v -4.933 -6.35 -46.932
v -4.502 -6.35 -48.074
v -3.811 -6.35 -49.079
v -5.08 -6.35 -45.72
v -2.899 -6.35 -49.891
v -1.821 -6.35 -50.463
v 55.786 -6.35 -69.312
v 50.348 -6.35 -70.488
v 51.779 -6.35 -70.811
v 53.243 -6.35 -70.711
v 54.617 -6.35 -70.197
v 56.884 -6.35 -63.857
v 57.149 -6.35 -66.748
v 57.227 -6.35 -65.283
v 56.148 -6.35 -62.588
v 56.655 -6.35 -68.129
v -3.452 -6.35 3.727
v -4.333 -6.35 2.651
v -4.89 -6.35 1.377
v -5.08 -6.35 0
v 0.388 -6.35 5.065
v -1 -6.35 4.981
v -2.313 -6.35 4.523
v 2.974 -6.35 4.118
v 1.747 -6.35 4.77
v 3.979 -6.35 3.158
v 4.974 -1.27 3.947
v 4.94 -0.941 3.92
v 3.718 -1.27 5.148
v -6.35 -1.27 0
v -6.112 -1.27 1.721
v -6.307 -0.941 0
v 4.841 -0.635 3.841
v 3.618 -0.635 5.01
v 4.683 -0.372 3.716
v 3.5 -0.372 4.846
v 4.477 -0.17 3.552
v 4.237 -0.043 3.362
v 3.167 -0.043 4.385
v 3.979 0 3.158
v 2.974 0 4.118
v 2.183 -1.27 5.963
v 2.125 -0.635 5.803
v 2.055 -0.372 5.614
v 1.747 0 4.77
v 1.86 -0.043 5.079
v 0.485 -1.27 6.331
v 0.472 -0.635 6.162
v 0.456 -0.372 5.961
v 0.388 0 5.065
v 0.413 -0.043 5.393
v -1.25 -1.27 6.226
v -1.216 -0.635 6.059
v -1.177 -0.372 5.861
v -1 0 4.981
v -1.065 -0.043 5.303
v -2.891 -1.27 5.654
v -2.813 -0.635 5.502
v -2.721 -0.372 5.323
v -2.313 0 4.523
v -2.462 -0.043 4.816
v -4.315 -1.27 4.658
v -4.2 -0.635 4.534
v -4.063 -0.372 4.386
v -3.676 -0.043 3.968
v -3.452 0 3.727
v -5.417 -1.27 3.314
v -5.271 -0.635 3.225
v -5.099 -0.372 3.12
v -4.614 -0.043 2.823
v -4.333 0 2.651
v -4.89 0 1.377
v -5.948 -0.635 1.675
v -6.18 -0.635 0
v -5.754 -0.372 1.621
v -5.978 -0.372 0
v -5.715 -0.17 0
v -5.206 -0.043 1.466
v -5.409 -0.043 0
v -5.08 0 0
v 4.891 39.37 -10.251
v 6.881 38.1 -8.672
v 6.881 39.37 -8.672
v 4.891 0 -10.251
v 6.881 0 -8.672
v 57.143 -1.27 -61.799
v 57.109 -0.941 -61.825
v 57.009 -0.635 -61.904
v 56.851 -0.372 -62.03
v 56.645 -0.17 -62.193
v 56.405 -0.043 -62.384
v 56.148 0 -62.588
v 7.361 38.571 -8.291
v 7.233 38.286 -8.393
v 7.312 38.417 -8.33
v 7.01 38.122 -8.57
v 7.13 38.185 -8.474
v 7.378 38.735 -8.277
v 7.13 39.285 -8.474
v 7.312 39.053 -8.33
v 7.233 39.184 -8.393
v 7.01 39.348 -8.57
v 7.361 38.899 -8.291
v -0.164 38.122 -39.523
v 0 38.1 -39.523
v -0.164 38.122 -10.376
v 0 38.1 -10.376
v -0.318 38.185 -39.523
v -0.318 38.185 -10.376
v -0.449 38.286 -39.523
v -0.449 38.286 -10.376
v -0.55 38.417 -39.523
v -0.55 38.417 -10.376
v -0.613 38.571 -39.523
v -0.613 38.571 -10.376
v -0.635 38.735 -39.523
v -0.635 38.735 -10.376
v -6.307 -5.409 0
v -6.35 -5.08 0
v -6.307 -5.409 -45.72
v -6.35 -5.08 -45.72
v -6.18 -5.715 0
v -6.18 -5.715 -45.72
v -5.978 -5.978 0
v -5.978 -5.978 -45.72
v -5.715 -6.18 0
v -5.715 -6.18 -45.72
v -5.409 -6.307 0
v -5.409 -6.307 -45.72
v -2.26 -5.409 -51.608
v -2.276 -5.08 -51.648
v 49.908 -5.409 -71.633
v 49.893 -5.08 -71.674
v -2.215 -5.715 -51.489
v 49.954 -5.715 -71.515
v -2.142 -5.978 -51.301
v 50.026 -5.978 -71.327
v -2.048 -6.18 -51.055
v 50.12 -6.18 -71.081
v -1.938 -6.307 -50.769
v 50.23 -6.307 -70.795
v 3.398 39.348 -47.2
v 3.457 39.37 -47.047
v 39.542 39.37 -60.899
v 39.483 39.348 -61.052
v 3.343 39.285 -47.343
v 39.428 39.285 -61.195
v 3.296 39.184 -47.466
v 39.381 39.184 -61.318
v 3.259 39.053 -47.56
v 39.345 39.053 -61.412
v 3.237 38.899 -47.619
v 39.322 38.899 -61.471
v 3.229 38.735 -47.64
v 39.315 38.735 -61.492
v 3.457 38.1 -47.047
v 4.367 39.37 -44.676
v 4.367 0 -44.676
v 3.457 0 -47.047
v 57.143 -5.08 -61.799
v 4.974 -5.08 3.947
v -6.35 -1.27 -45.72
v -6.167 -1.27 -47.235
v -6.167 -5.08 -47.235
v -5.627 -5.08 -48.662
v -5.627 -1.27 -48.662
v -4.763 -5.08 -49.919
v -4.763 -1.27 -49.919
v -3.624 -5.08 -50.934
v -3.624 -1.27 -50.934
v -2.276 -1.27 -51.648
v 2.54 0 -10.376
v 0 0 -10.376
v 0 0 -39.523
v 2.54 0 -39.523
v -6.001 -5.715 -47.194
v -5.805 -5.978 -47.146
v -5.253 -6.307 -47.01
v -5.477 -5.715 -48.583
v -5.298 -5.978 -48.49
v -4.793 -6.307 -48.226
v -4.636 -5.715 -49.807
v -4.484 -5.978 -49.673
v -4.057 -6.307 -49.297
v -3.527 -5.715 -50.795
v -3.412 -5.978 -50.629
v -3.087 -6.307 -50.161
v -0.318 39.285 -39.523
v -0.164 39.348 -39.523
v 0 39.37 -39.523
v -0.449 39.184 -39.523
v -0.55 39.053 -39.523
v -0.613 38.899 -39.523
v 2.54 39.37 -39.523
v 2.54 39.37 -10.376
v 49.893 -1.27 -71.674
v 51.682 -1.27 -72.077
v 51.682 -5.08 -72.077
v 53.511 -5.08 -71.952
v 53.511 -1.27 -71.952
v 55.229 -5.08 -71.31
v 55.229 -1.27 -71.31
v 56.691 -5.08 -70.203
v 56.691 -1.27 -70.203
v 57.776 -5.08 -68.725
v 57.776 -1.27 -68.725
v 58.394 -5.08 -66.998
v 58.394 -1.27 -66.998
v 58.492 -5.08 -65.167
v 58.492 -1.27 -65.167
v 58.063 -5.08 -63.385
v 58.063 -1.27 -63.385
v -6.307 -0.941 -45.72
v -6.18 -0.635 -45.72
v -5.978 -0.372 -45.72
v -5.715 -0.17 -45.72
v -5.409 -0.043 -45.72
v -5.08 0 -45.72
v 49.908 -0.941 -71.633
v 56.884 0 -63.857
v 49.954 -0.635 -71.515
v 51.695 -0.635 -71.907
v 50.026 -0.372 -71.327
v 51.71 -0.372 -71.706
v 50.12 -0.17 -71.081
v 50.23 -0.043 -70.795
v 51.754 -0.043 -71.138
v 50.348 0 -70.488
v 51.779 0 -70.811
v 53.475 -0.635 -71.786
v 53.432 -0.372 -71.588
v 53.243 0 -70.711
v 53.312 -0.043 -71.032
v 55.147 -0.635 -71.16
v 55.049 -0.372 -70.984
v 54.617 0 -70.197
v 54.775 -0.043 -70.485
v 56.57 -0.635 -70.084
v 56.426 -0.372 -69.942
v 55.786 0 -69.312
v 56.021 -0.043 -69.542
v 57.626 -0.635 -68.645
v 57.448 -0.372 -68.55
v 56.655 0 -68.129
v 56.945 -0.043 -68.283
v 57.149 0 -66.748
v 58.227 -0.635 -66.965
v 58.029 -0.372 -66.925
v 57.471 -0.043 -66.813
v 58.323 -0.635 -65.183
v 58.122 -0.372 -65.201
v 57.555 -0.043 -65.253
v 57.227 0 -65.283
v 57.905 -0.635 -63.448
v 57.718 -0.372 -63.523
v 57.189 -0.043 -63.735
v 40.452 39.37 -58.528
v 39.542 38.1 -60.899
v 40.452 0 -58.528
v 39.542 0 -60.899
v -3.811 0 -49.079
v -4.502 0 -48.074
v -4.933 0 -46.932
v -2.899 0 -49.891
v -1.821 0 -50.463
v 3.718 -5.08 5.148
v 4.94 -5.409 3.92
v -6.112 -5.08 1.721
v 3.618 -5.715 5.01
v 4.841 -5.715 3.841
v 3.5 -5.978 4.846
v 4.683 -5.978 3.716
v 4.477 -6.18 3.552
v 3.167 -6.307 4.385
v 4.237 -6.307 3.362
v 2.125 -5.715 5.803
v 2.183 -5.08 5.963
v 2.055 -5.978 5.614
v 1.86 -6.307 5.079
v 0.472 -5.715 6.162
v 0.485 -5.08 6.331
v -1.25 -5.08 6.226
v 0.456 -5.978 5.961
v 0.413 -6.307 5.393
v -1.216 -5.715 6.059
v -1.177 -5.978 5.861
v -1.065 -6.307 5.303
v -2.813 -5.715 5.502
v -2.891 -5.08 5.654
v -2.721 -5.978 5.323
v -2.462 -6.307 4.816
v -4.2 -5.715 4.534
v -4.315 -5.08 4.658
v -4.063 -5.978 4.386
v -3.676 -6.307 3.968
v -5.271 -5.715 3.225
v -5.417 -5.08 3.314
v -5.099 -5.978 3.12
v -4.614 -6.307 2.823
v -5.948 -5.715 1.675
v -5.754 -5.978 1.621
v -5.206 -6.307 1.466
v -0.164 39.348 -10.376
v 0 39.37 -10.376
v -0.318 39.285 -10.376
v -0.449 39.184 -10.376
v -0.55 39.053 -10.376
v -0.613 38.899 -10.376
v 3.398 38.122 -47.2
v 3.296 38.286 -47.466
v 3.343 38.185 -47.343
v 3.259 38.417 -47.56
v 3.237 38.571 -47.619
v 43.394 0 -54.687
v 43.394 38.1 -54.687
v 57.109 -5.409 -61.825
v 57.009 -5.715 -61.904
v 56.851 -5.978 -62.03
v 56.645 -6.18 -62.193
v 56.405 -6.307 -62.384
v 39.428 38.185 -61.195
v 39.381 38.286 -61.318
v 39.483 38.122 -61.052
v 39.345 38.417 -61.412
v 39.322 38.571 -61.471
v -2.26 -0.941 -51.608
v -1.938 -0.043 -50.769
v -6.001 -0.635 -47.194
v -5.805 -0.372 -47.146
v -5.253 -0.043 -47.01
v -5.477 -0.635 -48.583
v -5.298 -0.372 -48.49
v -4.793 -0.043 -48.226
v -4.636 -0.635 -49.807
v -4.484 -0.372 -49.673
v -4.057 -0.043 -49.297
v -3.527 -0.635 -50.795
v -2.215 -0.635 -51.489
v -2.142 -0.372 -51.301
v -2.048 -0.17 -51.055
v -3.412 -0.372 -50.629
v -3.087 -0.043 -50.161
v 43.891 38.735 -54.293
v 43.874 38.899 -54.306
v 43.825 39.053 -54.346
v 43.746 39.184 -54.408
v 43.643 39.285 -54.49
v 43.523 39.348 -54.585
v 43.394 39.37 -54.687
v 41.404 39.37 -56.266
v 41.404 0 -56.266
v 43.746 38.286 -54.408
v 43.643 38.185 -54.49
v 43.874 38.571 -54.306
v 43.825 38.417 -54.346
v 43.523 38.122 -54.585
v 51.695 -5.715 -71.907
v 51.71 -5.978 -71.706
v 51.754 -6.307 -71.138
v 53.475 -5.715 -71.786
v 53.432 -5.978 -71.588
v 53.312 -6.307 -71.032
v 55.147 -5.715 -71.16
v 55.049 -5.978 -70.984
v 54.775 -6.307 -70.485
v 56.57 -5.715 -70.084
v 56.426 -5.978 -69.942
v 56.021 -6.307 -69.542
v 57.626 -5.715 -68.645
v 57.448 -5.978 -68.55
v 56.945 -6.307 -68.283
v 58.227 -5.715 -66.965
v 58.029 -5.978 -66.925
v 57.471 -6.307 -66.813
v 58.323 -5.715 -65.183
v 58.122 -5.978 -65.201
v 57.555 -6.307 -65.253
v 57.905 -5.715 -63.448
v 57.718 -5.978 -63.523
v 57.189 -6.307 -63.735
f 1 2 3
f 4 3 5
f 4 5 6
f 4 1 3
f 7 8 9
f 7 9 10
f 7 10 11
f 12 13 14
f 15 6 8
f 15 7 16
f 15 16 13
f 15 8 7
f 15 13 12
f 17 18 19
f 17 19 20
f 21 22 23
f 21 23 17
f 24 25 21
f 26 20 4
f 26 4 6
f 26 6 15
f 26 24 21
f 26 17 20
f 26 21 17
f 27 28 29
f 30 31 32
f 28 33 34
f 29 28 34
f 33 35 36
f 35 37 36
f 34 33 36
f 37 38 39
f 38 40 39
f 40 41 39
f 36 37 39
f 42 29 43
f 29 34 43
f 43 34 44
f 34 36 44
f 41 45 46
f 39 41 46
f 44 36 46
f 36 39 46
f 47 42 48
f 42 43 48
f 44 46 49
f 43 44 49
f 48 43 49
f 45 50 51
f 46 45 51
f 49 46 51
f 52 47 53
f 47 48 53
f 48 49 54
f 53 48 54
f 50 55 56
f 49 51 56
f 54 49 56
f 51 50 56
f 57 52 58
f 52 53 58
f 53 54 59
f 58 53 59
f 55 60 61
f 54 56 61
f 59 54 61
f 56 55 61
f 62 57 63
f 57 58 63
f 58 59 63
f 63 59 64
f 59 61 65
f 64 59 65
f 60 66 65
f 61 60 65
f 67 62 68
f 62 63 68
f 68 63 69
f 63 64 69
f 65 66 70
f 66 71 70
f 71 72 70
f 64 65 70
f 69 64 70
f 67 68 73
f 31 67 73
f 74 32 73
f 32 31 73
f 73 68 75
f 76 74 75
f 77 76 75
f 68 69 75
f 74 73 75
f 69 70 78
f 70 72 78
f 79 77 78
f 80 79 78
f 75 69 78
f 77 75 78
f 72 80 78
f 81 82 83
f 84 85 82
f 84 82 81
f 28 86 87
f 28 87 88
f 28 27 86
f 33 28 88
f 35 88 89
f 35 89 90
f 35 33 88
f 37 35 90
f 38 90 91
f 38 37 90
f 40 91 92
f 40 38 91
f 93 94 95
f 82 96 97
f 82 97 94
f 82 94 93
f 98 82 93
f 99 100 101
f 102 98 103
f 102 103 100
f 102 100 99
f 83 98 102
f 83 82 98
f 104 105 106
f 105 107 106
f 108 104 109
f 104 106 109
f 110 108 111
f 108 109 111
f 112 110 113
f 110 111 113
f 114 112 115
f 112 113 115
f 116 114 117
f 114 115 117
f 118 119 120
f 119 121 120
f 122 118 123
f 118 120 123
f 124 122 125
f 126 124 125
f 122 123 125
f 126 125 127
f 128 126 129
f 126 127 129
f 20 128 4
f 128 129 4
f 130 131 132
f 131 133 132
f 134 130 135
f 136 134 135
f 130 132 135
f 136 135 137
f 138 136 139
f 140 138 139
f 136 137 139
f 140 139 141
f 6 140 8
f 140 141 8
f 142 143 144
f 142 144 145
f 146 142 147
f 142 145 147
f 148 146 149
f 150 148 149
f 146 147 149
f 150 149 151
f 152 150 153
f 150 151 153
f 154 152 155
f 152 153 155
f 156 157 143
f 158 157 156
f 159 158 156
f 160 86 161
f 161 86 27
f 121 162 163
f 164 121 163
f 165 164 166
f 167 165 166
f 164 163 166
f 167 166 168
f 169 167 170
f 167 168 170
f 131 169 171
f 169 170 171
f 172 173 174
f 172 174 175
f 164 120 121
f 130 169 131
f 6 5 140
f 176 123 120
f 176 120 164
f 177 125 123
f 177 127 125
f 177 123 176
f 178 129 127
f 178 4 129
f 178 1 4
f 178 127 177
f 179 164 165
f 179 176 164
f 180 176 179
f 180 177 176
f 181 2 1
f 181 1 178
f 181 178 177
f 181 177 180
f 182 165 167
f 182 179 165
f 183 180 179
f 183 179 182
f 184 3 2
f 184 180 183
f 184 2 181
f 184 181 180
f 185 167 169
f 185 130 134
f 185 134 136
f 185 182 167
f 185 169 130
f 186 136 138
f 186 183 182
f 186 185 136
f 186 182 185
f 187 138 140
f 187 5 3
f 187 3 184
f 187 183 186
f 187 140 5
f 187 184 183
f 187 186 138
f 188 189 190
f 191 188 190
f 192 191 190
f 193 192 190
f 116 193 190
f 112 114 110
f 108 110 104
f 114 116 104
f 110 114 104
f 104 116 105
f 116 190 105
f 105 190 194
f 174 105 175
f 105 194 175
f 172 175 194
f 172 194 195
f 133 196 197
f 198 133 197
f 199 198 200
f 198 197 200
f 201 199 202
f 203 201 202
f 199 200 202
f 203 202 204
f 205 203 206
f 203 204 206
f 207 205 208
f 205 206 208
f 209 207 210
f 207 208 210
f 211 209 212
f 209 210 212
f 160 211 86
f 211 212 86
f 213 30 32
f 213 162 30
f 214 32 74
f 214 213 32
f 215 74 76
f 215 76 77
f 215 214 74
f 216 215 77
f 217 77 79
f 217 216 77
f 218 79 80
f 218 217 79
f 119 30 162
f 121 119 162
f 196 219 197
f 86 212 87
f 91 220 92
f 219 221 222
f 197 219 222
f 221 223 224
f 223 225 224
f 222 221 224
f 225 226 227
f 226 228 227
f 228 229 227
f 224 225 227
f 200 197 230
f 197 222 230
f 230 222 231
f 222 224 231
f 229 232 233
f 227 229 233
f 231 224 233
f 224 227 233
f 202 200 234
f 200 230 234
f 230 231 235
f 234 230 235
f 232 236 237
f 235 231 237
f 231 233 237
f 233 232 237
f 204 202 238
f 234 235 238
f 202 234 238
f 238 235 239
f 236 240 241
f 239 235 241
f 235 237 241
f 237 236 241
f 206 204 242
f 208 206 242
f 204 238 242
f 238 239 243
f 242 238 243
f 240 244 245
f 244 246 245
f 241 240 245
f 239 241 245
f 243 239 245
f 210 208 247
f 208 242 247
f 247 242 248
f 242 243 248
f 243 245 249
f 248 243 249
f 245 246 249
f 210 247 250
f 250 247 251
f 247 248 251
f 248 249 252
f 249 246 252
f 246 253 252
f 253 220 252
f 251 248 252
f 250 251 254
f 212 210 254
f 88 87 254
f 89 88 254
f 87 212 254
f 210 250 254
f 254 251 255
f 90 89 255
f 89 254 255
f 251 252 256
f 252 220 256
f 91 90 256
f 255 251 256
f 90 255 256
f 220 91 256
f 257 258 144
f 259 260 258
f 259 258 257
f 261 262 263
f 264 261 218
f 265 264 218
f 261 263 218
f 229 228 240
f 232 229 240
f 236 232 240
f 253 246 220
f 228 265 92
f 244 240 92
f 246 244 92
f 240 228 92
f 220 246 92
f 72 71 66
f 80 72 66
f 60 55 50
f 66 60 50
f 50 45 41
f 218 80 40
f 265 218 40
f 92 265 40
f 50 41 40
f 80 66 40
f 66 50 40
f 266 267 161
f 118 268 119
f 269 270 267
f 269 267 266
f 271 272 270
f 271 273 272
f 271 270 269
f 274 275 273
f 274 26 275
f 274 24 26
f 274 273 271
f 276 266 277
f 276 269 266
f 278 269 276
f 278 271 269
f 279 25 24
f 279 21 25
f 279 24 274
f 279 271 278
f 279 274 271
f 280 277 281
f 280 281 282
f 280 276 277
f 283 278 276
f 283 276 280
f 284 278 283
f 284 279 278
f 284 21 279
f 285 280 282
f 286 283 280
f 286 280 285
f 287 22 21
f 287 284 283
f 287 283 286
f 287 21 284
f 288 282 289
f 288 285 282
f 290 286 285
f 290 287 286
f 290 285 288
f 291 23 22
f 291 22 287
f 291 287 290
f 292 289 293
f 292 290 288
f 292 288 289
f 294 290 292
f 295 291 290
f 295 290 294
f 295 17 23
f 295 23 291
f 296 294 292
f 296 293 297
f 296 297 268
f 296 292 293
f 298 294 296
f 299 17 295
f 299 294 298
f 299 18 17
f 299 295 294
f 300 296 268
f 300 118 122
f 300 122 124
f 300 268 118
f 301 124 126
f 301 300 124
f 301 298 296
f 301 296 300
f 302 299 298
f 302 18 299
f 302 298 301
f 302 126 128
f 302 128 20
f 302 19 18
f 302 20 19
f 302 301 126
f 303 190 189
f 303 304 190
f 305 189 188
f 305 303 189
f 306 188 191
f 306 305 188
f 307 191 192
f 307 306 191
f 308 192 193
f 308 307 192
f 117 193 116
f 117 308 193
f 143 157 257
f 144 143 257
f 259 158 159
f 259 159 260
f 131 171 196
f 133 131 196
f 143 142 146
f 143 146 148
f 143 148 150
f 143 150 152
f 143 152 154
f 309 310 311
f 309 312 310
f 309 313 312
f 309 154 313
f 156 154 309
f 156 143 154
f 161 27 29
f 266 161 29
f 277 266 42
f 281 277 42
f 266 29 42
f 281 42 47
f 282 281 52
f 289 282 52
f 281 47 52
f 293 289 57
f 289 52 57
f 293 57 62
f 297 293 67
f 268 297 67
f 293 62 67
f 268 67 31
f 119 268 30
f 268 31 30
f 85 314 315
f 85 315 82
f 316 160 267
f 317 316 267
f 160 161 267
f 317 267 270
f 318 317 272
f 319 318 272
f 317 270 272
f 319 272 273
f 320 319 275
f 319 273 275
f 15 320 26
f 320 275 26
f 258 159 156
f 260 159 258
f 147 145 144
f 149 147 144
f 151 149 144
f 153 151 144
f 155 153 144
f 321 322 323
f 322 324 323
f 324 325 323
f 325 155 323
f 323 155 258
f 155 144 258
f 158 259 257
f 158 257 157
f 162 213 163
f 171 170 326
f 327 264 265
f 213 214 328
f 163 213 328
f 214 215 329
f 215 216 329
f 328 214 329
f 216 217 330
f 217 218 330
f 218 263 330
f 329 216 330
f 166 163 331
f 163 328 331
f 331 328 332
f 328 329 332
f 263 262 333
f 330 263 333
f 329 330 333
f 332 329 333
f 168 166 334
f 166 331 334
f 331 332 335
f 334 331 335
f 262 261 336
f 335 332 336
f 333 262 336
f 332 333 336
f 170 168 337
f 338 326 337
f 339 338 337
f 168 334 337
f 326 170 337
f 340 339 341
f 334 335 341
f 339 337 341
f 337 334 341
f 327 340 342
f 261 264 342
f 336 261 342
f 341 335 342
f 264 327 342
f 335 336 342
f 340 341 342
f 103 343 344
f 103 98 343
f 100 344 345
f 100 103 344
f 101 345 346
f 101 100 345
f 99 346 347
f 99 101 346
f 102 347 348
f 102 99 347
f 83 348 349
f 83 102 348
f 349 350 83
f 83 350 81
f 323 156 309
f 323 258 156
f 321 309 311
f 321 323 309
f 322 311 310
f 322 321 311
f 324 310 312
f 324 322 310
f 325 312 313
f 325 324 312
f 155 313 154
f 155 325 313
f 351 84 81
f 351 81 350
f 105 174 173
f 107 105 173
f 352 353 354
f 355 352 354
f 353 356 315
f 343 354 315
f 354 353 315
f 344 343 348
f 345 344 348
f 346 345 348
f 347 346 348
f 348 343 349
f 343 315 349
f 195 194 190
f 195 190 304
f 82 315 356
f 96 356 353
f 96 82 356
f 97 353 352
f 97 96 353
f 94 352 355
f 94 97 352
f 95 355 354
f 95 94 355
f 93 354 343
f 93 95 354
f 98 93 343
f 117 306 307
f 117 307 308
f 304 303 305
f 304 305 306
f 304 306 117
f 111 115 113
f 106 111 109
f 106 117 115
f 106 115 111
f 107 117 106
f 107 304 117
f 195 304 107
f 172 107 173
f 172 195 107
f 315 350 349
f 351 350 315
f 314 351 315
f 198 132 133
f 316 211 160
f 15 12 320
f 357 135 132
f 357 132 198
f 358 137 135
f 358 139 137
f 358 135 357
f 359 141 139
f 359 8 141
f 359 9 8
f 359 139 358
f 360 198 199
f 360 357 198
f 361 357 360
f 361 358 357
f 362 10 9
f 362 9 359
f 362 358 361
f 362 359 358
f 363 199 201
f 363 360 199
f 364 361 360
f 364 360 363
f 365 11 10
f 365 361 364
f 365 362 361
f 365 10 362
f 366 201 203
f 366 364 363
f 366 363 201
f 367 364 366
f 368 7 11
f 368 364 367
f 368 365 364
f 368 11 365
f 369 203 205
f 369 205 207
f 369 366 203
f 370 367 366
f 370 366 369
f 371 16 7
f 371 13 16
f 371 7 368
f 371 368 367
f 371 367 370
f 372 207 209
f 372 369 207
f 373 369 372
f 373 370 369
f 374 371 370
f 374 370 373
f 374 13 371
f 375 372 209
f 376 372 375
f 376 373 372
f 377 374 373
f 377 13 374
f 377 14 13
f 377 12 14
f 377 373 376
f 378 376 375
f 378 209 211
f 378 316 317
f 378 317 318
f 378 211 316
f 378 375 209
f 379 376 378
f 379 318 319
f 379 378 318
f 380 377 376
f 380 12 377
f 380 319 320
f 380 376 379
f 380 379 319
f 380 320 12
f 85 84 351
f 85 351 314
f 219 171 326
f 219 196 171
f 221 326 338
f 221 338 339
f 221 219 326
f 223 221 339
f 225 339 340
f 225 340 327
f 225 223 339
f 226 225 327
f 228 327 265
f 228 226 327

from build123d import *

# Parameters (mm, degrees)
F0_W      = 2.54
F0_H      = 29.1471965611
F1_DEPTH  = 6.35
F2_DEPTH  = 39.37
F3_W      = 1.27
F3_H      = 58.7419511778
F4_DEPTH  = 0.635
F5_R      = 0.63499
F6_W      = 38.6529213808
F6_H      = 1.27
F7_DEPTH  = 0.635
F8_R      = 0.63499
F9_W      = 1.27
F9_H      = 29.1471965611
F10_DEPTH = 0.635
F11_R     = 0.63499
F12_R     = 1.27


# Not quite as in the source:
# - a fillet or chamfer is up to 0.001 mm smaller than in the source, because OpenCascade refuses the exact size


with BuildPart() as f1:
    # F0 (on Front) → F1 (new body)
    with BuildSketch(Plane.XZ):
        with BuildLine():
            Line((57.1427482982, -61.7985644783), (4.9742740829, 3.9470365205))
            ThreePointArc((4.9742740829, 3.9470365205), (-2.0899592777, 5.9962129759), (-6.3499999957, -1.22e-08))
            Line((-6.3499999957, -1.22e-08), (-6.3499999957, -45.7199999971))
            ThreePointArc((-6.3499999957, -45.7199999971), (-5.2332012935, -49.3166796015), (-2.2756364753, -51.6482357053))
            Line((-2.2756364754, -51.6482357053), (49.89283774, -71.6738367193))
            ThreePointArc((49.89283774, -71.6738367193), (57.2871568315, -69.5034711949), (57.1427482982, -61.7985644783))
        make_face()
        Polygon((0, -10.3762075305), (0, 0), (6.8810137765, -8.6718347243), (43.39386847, -54.6873567827), (52.1684742327, -65.7456010206), (39.5421703506, -60.8988170648), (3.4565595225, -47.0468488857), (0, -45.72), (0, -39.5234040916), align=None, mode=Mode.SUBTRACT)
        Polygon((6.8810137765, -8.6718347243), (0, 0), (0, -10.3762075305), (2.54, -10.3762075305), (2.54, -39.5234040916), (0, -39.5234040916), (0, -45.72), (3.4565595225, -47.0468488857), (4.3668141144, -44.6755546023), (40.4524249424, -58.5275227815), (39.5421703506, -60.8988170648), (52.1684742327, -65.7456010206), (43.39386847, -54.6873567827), (41.4041588386, -56.2661713958), (4.891304145, -10.2506493374), align=None)
        with Locations((1.27, -24.949805811)):
            Rectangle(F0_W, F0_H)
        Polygon((43.39386847, -54.6873567827), (6.8810137765, -8.6718347243), (4.891304145, -10.2506493374), (41.4041588386, -56.2661713958), align=None)
        Polygon((4.3668141144, -44.6755546023), (3.4565595225, -47.0468488857), (39.5421703506, -60.8988170648), (40.4524249424, -58.5275227815), align=None)
    extrude(amount=F1_DEPTH)

    # F12
    f12_edges = [f1.edges().sort_by_distance(p)[0] for p in [
        (-6.35, -6.35, -22.86),
        (-6.35, 0, -22.86),
    ]]
    fillet(f12_edges, radius=F12_R)


with BuildPart() as f2:
    # F0 (on Front) → F2 (new body)
    with BuildSketch(Plane.XZ):
        with Locations((1.27, -24.949805811)):
            Rectangle(F0_W, F0_H)
    extrude(amount=-F2_DEPTH)

    # F9 (on face) → F10 (join)
    with BuildSketch(Plane(origin=(0, 0, 0), x_dir=(0, -1, 0), z_dir=(-1, 0, 0))):
        with Locations((-38.735, -24.949805811)):
            Rectangle(F9_W, F9_H)
    extrude(amount=F10_DEPTH)

    # F11 (radius 0.635 in the source; OpenCascade refuses exactly that, so slightly less here)
    f11_edges = [f2.edges().sort_by_distance(p)[0] for p in [
        (-0.635, 38.1, -24.949806),
        (-0.635, 39.37, -24.949806),
    ]]
    fillet(f11_edges, radius=F11_R)


with BuildPart() as f2b:
    # F0 (on Front) → F2, piece 2 (new body)
    with BuildSketch(Plane.XZ):
        Polygon((4.3668141144, -44.6755546023), (3.4565595225, -47.0468488857), (39.5421703506, -60.8988170648), (40.4524249424, -58.5275227815), align=None)
    extrude(amount=-F2_DEPTH)

    # F6 (on face) → F7 (join)
    with BuildSketch(Plane(origin=(-15.2963256614, 0, -39.8482907104), x_dir=(0.9335804265, 0, -0.3583679495), z_dir=(-0.3583679495, 0, -0.9335804265))):
        with Locations((39.4135197714, -38.735)):
            Rectangle(F6_W, F6_H)
    extrude(amount=F7_DEPTH)

    # F8 (radius 0.635 in the source; OpenCascade refuses exactly that, so slightly less here)
    f8_edges = [f2b.edges().sort_by_distance(p)[0] for p in [
        (21.271801, 38.1, -54.565657),
        (21.271801, 39.37, -54.565657),
    ]]
    fillet(f8_edges, radius=F8_R)


with BuildPart() as f2c:
    # F0 (on Front) → F2, piece 3 (new body)
    with BuildSketch(Plane.XZ):
        Polygon((43.39386847, -54.6873567827), (6.8810137765, -8.6718347243), (4.891304145, -10.2506493374), (41.4041588386, -56.2661713958), align=None)
    extrude(amount=-F2_DEPTH)

    # F3 (on face) → F4 (join)
    with BuildSketch(Plane(origin=(0, 0, 0), x_dir=(0, 1, 0), z_dir=(0.7833502486, 0, 0.6215805563))):
        with Locations((38.735, -40.4411638473)):
            Rectangle(F3_W, F3_H)
    extrude(amount=F4_DEPTH)

    # F5 (radius 0.635 in the source; OpenCascade refuses exactly that, so slightly less here)
    f5_edges = [f2c.edges().sort_by_distance(p)[0] for p in [
        (25.634869, 38.1, -31.284892),
        (25.634869, 39.37, -31.284892),
    ]]
    fillet(f5_edges, radius=F5_R)


solid = Compound([f1.part, f2.part, f2b.part, f2c.part])
